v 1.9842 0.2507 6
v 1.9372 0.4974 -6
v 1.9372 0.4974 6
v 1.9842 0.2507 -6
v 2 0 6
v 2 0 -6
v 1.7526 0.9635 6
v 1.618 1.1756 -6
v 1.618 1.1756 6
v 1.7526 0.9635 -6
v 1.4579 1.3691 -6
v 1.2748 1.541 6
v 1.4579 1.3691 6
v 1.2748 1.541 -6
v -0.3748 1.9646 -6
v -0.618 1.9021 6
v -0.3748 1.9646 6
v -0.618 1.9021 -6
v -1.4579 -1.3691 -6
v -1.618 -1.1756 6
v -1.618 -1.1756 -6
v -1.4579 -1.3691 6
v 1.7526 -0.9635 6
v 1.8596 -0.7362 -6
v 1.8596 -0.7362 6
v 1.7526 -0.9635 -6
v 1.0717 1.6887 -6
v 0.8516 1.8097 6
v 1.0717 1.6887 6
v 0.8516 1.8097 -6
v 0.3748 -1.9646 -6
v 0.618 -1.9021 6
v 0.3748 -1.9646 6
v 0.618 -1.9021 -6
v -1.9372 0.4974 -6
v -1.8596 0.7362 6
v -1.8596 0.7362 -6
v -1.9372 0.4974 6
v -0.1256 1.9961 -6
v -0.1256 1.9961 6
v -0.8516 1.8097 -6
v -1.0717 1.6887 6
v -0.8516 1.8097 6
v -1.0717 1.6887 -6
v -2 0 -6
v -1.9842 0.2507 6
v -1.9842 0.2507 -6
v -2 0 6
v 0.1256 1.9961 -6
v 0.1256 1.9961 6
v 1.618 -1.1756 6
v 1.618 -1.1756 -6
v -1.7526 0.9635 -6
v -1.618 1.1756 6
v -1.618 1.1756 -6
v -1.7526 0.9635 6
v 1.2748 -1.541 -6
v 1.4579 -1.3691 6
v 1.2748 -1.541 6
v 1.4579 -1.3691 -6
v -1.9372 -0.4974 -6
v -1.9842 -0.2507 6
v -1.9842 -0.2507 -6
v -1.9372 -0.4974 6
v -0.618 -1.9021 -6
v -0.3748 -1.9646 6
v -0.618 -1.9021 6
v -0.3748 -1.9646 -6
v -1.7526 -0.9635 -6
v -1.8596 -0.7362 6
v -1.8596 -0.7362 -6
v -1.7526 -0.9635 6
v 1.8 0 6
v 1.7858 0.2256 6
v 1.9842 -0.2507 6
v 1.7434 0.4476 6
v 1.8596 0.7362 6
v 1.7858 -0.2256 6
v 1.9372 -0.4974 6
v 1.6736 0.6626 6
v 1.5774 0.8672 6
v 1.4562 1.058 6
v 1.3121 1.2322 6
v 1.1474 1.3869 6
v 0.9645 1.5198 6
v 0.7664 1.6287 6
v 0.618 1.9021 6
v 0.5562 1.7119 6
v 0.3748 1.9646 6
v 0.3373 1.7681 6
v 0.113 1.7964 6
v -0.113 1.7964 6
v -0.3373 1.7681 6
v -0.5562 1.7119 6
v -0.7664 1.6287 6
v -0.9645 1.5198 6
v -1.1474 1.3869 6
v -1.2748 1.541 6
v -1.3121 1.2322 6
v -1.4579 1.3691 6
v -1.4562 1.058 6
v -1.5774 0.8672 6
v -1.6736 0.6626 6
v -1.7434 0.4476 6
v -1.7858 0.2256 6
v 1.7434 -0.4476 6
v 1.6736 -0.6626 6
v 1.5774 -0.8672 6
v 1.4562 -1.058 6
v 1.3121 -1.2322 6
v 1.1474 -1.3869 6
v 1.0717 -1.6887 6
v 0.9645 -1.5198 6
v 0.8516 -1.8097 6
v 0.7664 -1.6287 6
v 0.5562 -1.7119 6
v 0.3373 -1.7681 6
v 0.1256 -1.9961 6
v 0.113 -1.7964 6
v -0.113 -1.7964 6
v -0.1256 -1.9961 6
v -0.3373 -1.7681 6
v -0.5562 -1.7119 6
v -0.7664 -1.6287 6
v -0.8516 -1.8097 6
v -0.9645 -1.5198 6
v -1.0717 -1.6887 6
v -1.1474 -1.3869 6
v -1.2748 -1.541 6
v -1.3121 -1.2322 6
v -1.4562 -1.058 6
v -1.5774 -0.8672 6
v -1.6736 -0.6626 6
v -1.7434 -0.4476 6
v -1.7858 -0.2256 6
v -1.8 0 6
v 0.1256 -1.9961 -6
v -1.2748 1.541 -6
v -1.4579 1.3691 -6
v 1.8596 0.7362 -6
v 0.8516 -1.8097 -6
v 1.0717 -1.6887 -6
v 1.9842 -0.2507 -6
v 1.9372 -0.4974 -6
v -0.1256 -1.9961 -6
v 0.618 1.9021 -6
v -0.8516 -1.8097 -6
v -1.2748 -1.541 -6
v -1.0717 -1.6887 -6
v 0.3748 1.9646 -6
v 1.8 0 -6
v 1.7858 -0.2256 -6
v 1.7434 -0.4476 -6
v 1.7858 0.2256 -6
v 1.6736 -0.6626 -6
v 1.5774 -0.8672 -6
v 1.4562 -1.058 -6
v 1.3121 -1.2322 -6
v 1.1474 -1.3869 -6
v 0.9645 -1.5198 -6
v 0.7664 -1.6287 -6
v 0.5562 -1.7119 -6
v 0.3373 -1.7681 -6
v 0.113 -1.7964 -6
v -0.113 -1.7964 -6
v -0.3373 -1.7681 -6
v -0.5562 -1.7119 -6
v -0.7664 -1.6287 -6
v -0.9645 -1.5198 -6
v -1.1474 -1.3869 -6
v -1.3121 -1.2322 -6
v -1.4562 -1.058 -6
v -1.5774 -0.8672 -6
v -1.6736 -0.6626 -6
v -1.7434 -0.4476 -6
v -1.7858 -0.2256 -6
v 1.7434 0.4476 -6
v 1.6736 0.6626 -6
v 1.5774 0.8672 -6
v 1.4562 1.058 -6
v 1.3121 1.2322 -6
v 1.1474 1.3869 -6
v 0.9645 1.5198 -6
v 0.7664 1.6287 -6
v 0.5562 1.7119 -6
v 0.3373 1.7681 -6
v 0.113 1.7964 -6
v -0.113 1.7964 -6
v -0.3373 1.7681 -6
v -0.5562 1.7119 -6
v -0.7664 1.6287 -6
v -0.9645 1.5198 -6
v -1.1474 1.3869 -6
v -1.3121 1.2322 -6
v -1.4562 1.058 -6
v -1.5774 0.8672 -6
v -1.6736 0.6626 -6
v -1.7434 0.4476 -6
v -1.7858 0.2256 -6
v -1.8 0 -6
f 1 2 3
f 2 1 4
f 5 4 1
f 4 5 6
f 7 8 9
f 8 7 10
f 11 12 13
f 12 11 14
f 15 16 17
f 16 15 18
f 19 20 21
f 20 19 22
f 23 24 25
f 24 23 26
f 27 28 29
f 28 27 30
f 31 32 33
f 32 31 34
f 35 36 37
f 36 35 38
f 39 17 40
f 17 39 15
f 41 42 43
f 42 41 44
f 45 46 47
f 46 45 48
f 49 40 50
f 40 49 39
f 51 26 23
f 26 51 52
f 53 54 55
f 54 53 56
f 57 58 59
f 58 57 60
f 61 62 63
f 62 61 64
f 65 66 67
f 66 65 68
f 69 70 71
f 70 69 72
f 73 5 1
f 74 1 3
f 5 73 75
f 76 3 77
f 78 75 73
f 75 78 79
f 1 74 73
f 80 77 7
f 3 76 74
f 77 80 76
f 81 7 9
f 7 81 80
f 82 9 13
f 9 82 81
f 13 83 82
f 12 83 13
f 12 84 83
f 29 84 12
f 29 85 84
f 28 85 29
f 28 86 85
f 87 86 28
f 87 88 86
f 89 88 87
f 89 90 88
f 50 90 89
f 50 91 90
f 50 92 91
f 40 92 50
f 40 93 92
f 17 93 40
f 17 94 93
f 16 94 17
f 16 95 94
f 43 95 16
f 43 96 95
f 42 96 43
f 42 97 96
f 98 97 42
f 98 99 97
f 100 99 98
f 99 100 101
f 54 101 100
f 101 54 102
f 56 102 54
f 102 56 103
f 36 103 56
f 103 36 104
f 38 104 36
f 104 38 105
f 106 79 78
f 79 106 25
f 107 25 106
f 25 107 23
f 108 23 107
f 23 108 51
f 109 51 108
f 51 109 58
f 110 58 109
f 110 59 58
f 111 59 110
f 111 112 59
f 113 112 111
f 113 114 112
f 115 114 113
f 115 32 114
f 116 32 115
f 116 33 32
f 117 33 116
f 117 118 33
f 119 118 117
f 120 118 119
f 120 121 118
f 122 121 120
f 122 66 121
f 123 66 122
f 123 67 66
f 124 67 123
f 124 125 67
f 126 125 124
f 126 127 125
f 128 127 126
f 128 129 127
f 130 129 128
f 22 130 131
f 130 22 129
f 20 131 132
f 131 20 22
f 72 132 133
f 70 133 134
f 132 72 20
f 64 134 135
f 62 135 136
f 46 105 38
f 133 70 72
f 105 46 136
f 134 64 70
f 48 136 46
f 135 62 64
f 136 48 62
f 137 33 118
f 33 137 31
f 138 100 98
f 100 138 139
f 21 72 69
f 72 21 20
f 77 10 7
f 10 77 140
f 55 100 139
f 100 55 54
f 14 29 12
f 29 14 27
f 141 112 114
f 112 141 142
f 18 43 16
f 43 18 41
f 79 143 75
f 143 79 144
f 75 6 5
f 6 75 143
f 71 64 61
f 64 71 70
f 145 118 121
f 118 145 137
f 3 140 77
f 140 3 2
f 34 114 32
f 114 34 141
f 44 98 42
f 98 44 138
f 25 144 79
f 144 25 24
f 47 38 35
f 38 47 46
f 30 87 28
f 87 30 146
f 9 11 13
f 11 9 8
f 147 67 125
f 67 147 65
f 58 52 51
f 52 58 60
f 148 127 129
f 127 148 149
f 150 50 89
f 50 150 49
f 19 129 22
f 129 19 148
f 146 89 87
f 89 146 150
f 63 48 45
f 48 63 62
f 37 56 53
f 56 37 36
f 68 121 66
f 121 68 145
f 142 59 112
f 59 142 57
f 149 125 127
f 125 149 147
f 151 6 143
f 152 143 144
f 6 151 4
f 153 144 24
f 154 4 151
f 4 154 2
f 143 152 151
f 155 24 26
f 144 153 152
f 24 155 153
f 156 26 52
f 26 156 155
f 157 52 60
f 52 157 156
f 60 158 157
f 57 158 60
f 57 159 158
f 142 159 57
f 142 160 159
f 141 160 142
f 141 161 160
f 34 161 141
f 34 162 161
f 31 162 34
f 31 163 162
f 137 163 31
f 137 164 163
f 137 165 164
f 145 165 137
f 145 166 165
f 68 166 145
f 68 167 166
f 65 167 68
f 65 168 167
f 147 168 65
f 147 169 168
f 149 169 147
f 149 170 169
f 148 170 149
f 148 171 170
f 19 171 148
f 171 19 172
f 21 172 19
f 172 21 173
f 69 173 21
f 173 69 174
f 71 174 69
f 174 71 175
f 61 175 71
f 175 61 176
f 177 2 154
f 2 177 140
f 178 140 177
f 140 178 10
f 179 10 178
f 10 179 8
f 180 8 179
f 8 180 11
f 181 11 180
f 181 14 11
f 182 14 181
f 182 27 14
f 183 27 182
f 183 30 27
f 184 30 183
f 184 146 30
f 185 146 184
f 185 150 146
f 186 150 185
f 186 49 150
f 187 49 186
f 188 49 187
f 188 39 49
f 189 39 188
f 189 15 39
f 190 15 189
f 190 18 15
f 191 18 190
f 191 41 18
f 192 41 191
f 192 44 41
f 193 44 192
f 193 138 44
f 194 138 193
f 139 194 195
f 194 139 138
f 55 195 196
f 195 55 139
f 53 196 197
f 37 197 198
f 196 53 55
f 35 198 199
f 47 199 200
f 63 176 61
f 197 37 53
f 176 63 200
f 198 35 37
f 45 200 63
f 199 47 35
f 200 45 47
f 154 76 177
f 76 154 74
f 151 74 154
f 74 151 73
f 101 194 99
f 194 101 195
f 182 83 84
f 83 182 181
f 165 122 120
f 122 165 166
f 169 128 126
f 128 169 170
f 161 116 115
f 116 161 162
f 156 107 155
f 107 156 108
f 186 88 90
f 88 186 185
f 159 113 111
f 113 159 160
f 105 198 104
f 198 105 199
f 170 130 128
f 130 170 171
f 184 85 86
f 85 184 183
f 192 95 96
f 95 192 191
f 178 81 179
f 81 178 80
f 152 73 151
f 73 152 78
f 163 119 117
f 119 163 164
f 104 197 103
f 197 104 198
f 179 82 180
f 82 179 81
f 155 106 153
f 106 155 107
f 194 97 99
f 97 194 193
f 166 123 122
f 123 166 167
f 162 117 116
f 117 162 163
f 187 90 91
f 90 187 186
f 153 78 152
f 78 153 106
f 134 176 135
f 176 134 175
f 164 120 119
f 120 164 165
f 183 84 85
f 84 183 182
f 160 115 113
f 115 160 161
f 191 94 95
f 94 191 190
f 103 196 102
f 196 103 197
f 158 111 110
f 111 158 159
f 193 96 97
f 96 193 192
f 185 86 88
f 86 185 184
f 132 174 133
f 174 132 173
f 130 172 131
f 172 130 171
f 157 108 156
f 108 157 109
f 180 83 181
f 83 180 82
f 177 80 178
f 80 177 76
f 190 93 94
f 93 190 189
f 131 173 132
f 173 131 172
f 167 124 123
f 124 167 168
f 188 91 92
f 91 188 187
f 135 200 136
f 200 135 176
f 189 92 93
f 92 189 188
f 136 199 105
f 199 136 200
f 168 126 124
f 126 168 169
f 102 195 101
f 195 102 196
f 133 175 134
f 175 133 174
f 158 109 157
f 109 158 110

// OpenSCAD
$fn = 50;


difference() {
	union() {
		translate(v = [0, 0, -6.0000000000]) {
			cylinder(h = 12, r = 2.0000000000);
		}
	}
	union() {
		#translate(v = [0, 0, -100.0000000000]) {
			cylinder(h = 200, r = 1.8000000000);
		}
	}
}
